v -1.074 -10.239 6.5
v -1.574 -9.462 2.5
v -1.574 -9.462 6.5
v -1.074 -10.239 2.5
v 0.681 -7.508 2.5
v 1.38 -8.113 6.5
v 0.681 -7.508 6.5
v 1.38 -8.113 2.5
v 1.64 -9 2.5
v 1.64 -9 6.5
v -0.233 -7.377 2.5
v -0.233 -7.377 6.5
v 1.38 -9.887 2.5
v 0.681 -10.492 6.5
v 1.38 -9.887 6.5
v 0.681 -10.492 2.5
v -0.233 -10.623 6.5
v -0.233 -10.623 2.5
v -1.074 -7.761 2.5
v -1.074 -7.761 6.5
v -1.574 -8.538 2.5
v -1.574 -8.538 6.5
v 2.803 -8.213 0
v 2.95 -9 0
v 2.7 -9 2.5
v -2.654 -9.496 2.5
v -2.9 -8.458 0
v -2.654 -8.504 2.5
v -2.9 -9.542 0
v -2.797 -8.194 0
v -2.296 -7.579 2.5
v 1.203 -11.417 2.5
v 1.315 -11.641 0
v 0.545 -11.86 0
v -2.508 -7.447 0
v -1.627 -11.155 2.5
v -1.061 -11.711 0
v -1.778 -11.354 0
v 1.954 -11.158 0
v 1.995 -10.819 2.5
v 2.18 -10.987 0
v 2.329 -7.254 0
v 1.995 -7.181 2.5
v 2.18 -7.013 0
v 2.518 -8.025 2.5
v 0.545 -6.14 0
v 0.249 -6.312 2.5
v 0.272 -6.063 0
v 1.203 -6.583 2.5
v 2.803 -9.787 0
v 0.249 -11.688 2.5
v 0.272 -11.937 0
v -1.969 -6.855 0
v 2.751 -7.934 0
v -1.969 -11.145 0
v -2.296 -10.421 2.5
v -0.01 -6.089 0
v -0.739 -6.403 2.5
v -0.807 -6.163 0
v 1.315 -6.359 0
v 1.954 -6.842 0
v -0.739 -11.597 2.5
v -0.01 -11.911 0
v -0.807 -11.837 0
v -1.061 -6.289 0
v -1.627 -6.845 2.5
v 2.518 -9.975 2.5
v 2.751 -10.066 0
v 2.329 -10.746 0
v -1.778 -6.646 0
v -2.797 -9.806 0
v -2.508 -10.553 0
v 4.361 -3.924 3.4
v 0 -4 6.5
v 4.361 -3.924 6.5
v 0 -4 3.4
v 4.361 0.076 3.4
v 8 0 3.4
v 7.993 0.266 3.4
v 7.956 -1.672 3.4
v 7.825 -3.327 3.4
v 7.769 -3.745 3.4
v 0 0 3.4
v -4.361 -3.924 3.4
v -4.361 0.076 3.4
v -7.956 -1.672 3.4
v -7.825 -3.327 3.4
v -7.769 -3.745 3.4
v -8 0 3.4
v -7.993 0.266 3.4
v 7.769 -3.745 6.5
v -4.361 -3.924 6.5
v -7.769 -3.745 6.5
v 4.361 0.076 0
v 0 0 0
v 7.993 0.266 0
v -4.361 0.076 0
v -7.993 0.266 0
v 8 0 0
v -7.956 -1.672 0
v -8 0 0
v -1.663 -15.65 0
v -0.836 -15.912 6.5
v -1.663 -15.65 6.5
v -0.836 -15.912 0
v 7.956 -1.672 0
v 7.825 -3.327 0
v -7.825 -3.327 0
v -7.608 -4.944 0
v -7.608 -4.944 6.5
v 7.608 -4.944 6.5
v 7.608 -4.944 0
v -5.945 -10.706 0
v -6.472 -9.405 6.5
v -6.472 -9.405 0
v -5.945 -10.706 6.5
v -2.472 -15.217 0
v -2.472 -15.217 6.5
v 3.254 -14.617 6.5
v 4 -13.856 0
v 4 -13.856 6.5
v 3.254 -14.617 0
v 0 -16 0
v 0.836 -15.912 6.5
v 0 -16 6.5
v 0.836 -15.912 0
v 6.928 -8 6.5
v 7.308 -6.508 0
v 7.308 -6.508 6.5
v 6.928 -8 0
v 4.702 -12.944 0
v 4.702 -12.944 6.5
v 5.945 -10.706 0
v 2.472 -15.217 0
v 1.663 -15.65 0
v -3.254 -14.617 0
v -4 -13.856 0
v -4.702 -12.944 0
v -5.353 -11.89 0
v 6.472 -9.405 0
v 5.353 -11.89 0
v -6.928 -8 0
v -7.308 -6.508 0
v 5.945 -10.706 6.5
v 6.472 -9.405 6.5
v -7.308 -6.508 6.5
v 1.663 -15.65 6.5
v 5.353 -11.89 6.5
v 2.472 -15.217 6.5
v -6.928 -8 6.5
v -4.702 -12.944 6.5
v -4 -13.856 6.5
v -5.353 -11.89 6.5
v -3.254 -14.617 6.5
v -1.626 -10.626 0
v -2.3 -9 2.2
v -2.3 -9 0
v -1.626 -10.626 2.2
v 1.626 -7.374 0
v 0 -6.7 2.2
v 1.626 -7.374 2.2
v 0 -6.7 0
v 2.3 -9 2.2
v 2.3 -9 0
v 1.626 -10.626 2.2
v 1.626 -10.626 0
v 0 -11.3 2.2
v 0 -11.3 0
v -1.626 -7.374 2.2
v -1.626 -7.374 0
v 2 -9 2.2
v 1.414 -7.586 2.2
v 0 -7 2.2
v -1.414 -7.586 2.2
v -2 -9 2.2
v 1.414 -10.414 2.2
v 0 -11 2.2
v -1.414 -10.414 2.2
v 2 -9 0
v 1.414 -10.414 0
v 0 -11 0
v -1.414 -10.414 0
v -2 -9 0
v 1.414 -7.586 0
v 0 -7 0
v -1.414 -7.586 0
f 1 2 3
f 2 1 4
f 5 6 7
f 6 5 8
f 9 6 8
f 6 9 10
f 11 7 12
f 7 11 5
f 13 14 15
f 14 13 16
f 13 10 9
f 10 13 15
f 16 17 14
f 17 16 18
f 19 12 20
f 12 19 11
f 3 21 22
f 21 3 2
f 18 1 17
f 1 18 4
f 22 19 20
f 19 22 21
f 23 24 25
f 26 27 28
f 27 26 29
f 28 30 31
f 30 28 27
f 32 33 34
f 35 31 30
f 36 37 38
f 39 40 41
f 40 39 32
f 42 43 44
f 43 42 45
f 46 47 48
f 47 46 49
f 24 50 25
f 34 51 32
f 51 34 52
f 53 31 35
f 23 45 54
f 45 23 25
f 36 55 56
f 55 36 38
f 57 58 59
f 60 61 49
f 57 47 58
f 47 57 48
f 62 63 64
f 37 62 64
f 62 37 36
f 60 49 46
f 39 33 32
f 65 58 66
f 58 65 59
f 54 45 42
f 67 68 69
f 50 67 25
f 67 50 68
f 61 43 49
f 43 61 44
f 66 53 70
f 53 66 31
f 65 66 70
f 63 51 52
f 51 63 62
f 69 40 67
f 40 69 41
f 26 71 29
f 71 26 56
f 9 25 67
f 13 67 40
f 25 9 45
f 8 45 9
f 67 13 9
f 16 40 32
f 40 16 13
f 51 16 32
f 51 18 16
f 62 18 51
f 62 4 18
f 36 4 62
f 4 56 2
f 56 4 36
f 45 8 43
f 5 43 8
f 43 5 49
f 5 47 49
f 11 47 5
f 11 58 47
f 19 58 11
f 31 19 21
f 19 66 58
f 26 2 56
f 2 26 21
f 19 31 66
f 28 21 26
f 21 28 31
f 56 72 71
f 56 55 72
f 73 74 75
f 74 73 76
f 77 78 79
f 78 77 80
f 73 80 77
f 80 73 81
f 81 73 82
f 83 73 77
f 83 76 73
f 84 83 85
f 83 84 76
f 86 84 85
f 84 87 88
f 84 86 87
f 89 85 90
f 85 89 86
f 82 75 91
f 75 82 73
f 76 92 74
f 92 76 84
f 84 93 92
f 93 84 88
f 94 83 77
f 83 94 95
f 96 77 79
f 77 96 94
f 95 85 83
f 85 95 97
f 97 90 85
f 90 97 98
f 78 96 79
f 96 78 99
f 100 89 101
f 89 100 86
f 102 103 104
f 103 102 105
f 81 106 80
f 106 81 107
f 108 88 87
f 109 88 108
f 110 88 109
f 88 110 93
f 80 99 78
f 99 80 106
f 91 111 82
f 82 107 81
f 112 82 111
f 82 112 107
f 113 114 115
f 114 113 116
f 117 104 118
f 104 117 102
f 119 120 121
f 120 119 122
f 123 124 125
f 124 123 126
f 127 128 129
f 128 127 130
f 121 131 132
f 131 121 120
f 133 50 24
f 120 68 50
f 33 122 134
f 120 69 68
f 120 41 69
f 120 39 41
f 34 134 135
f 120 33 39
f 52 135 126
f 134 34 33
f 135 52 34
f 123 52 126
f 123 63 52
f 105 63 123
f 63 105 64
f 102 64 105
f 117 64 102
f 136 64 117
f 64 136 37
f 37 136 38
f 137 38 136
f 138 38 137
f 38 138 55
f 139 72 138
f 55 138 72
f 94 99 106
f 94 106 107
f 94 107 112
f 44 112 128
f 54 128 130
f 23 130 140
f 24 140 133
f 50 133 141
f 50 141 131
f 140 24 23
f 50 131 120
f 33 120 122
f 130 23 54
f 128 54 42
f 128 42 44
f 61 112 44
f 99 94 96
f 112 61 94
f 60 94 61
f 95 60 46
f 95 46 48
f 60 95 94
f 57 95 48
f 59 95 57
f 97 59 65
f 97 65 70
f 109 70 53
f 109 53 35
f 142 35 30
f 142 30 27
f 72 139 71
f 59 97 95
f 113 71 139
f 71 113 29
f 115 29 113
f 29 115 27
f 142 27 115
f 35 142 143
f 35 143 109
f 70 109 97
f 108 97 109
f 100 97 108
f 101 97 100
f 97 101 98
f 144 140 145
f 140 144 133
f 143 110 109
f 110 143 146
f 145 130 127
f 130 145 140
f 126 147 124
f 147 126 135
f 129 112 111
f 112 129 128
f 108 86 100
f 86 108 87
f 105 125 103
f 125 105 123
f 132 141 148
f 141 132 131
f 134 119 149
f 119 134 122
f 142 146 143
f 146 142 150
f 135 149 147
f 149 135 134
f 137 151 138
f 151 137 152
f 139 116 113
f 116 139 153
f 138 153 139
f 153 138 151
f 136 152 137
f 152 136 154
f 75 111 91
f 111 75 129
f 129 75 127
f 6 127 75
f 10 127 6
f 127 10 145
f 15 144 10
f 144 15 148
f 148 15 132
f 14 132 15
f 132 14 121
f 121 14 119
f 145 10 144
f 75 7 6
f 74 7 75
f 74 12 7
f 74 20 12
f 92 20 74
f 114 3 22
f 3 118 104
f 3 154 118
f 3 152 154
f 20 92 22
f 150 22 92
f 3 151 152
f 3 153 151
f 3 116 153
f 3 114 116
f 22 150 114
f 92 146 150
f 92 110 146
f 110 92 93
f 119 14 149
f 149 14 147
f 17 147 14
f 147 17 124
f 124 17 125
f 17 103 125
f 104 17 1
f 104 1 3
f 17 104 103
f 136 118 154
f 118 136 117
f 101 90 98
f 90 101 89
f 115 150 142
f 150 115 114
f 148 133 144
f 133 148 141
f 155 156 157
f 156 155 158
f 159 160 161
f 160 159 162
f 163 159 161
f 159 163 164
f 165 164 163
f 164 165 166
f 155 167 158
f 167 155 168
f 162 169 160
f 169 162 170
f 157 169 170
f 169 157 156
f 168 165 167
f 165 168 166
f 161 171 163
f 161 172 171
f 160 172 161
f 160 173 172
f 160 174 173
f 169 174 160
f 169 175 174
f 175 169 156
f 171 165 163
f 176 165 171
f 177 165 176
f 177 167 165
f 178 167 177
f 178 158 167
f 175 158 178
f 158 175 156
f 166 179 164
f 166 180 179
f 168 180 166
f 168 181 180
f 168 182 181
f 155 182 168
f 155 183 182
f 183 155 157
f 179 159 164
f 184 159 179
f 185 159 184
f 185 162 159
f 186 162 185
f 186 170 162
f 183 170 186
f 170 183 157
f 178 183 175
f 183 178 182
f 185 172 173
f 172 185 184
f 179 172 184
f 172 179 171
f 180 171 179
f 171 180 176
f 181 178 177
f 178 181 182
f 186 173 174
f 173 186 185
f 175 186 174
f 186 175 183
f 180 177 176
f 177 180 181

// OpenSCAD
// Glass print bed holder for 10" borosilicate plate
// from ultibots.

plateDiam = 9.84 * 25.4;
plateThick = 3.3;

m3threadRad = 2.88/2;
m3HeadRad = 5.4/2;

plateRad = plateDiam/2;

tabHeight = 6.5;

difference() {
  scale([1,2,1]) cylinder(r=8,h=tabHeight,$fn=60);

  // m3 bolt hole
  translate([0,-9,-1]) {
    cylinder(r=m3threadRad+0.2,h=11,$fn=11);
    cylinder(r1=m3HeadRad+.35,r2=m3HeadRad,h=1+3-.5,$fn=17);
  }

  translate([0,plateRad-4,tabHeight-plateThick+.2]) {
     cylinder(r=plateRad,h=plateThick+.3,$fn=180);
     translate([0,4,-tabHeight+plateThick-1])
       cylinder(r=plateRad,h=plateThick+2,$fn=180);
  }

}

color("Cyan") { // support
  translate([0,-9,0]) difference() {
    cylinder(h=2.2,r=2.3,$fn=8);
    translate([0,0,-1])
      cylinder(h=4,r=2,$fn=8);
  }
}
